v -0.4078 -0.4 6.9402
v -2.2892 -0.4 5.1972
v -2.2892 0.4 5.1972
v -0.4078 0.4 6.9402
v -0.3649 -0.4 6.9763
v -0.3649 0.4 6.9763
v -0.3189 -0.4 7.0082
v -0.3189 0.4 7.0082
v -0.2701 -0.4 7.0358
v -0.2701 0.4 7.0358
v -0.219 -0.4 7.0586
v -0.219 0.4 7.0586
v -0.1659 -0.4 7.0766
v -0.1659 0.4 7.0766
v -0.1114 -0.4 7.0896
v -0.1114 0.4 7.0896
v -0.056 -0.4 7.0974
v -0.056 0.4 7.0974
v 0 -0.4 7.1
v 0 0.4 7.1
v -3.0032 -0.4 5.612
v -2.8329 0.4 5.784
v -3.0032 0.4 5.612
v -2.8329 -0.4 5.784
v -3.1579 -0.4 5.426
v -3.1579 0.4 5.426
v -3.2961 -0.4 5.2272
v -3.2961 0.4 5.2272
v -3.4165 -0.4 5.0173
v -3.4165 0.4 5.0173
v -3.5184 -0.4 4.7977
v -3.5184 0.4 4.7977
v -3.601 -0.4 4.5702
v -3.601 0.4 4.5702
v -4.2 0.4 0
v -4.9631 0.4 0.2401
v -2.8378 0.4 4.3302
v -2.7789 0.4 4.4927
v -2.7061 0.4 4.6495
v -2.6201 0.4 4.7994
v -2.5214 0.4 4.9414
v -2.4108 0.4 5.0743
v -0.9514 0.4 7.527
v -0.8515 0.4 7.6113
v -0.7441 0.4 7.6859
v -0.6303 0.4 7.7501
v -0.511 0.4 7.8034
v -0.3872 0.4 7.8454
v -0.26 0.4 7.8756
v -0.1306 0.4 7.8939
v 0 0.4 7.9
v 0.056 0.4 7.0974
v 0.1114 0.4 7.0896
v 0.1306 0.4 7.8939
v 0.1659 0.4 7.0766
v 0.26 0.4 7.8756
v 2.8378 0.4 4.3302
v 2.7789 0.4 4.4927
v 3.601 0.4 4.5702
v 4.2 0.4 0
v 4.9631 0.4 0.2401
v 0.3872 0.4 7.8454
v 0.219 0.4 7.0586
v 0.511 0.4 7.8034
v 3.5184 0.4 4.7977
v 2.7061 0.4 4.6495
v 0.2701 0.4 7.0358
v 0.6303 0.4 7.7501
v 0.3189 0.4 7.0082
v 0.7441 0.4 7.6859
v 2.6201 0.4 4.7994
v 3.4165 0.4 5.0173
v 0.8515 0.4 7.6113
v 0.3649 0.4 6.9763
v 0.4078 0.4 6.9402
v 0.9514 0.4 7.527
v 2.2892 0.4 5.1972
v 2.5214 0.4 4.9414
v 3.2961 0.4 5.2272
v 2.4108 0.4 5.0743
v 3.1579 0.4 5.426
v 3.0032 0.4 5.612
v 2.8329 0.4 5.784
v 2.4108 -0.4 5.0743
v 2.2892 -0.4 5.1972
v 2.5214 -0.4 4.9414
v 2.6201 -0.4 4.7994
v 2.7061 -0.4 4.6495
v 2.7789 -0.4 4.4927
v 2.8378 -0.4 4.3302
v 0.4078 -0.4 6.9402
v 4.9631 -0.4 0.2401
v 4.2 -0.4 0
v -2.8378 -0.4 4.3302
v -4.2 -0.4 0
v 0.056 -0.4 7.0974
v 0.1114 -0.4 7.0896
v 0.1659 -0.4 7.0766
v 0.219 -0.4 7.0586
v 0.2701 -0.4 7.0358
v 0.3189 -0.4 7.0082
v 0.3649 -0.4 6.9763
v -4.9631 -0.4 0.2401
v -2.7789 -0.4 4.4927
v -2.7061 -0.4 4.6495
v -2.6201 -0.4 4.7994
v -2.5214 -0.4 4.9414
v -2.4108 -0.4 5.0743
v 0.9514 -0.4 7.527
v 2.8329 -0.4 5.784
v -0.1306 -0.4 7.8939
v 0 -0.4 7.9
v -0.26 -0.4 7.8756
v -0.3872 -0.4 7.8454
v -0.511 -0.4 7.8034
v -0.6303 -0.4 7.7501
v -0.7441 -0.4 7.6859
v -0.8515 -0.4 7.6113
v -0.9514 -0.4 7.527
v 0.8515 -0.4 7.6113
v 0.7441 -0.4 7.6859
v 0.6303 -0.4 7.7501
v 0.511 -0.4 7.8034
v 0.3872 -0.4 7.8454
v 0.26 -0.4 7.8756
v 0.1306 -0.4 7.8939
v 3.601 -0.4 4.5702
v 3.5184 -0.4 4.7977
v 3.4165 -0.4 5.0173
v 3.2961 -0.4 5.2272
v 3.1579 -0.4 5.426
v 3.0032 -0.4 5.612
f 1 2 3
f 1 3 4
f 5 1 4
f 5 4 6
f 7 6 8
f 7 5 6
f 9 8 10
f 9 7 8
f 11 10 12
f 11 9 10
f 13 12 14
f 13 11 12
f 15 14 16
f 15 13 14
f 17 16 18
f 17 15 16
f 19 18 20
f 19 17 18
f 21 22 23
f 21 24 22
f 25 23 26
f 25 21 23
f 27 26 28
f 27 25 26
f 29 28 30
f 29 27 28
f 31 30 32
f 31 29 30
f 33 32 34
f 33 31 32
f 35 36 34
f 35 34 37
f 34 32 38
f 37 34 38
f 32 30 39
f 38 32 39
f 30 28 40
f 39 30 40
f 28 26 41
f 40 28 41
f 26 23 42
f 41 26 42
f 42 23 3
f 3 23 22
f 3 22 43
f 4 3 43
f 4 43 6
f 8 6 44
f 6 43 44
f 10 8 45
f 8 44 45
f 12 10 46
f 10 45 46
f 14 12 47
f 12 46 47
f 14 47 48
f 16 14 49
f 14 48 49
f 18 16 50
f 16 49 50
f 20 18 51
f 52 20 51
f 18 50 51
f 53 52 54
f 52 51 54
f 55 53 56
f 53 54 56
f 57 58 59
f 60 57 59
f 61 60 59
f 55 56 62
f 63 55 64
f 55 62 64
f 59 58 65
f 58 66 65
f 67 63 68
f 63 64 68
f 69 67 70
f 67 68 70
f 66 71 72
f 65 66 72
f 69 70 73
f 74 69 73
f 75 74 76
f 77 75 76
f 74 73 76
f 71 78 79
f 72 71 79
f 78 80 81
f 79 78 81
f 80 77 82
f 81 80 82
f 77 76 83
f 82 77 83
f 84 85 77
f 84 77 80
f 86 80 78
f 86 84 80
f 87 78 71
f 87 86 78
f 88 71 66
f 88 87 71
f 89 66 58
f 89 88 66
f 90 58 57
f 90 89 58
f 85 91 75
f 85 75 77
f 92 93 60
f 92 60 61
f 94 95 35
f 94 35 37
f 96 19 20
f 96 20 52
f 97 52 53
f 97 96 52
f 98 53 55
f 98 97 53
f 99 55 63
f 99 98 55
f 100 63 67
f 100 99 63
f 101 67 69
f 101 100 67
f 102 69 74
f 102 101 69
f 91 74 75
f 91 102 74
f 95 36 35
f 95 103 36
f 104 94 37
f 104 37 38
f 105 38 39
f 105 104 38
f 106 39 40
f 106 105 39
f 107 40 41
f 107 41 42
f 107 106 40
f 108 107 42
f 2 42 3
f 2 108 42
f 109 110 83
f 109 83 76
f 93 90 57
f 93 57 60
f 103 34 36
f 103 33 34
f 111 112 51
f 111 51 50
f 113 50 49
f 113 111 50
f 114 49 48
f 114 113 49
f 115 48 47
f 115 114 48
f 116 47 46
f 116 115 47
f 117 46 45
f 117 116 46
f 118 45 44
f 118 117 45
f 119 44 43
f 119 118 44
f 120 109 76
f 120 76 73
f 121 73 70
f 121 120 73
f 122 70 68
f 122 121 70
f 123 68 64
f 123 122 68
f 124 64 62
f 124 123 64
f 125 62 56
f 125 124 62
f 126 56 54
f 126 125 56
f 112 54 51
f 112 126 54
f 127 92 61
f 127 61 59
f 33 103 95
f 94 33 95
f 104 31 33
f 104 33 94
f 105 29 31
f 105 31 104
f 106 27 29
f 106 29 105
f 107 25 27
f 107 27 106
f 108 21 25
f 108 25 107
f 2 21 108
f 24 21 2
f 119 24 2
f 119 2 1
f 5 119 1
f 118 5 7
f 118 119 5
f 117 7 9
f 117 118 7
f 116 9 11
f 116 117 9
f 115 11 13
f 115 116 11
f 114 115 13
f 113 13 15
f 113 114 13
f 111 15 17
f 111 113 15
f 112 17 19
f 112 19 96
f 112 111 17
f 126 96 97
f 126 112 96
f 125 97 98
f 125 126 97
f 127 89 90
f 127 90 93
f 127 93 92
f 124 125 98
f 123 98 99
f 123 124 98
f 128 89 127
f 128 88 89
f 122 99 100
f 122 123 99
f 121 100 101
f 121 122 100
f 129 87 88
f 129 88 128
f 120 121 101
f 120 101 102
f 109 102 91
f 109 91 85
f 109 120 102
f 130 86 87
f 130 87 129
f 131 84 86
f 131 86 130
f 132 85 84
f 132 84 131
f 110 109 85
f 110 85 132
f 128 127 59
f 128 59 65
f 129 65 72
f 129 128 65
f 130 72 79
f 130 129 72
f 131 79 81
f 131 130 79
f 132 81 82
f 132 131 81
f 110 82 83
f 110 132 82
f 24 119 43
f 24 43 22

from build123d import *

# Parameters (mm, degrees)
F1_DEPTH = 0.4


with BuildPart() as f1:
    # F0 (on Front) → F1 (new body, symmetric)
    with BuildSketch(Plane.XZ):
        with BuildLine():
            Line((-4.963131, 0.240064), (-4.2, 0))
            Line((-4.2, 0), (-2.837828, 4.33016))
            ThreePointArc((-2.837828, 4.33016), (-2.620056, 4.799444), (-2.289198, 5.197168))
            Line((-2.289198, 5.197168), (-0.407759, 6.94015))
            ThreePointArc((-0.407759, 6.94015), (-0.218986, 7.05861), (0, 7.1))
            ThreePointArc((0, 7.1), (0.218986, 7.05861), (0.407759, 6.94015))
            Line((0.407759, 6.94015), (2.289198, 5.197168))
            ThreePointArc((2.289198, 5.197168), (2.620056, 4.799444), (2.837828, 4.33016))
            Line((2.837828, 4.33016), (4.2, 0))
            Line((4.2, 0), (4.963131, 0.240064))
            Line((4.963131, 0.240064), (3.600959, 4.570224))
            ThreePointArc((3.600959, 4.570224), (3.296079, 5.227221), (2.832877, 5.784035))
            Line((2.832877, 5.784035), (0.951439, 7.527017))
            ThreePointArc((0.951439, 7.527017), (0.510968, 7.803423), (0, 7.9))
            ThreePointArc((0, 7.9), (-0.510968, 7.803423), (-0.951439, 7.527017))
            Line((-0.951439, 7.527017), (-2.832877, 5.784035))
            ThreePointArc((-2.832877, 5.784035), (-3.296079, 5.227221), (-3.600959, 4.570224))
            Line((-3.600959, 4.570224), (-4.963131, 0.240064))
        make_face()
    extrude(amount=F1_DEPTH, both=True)


solid = f1.part
